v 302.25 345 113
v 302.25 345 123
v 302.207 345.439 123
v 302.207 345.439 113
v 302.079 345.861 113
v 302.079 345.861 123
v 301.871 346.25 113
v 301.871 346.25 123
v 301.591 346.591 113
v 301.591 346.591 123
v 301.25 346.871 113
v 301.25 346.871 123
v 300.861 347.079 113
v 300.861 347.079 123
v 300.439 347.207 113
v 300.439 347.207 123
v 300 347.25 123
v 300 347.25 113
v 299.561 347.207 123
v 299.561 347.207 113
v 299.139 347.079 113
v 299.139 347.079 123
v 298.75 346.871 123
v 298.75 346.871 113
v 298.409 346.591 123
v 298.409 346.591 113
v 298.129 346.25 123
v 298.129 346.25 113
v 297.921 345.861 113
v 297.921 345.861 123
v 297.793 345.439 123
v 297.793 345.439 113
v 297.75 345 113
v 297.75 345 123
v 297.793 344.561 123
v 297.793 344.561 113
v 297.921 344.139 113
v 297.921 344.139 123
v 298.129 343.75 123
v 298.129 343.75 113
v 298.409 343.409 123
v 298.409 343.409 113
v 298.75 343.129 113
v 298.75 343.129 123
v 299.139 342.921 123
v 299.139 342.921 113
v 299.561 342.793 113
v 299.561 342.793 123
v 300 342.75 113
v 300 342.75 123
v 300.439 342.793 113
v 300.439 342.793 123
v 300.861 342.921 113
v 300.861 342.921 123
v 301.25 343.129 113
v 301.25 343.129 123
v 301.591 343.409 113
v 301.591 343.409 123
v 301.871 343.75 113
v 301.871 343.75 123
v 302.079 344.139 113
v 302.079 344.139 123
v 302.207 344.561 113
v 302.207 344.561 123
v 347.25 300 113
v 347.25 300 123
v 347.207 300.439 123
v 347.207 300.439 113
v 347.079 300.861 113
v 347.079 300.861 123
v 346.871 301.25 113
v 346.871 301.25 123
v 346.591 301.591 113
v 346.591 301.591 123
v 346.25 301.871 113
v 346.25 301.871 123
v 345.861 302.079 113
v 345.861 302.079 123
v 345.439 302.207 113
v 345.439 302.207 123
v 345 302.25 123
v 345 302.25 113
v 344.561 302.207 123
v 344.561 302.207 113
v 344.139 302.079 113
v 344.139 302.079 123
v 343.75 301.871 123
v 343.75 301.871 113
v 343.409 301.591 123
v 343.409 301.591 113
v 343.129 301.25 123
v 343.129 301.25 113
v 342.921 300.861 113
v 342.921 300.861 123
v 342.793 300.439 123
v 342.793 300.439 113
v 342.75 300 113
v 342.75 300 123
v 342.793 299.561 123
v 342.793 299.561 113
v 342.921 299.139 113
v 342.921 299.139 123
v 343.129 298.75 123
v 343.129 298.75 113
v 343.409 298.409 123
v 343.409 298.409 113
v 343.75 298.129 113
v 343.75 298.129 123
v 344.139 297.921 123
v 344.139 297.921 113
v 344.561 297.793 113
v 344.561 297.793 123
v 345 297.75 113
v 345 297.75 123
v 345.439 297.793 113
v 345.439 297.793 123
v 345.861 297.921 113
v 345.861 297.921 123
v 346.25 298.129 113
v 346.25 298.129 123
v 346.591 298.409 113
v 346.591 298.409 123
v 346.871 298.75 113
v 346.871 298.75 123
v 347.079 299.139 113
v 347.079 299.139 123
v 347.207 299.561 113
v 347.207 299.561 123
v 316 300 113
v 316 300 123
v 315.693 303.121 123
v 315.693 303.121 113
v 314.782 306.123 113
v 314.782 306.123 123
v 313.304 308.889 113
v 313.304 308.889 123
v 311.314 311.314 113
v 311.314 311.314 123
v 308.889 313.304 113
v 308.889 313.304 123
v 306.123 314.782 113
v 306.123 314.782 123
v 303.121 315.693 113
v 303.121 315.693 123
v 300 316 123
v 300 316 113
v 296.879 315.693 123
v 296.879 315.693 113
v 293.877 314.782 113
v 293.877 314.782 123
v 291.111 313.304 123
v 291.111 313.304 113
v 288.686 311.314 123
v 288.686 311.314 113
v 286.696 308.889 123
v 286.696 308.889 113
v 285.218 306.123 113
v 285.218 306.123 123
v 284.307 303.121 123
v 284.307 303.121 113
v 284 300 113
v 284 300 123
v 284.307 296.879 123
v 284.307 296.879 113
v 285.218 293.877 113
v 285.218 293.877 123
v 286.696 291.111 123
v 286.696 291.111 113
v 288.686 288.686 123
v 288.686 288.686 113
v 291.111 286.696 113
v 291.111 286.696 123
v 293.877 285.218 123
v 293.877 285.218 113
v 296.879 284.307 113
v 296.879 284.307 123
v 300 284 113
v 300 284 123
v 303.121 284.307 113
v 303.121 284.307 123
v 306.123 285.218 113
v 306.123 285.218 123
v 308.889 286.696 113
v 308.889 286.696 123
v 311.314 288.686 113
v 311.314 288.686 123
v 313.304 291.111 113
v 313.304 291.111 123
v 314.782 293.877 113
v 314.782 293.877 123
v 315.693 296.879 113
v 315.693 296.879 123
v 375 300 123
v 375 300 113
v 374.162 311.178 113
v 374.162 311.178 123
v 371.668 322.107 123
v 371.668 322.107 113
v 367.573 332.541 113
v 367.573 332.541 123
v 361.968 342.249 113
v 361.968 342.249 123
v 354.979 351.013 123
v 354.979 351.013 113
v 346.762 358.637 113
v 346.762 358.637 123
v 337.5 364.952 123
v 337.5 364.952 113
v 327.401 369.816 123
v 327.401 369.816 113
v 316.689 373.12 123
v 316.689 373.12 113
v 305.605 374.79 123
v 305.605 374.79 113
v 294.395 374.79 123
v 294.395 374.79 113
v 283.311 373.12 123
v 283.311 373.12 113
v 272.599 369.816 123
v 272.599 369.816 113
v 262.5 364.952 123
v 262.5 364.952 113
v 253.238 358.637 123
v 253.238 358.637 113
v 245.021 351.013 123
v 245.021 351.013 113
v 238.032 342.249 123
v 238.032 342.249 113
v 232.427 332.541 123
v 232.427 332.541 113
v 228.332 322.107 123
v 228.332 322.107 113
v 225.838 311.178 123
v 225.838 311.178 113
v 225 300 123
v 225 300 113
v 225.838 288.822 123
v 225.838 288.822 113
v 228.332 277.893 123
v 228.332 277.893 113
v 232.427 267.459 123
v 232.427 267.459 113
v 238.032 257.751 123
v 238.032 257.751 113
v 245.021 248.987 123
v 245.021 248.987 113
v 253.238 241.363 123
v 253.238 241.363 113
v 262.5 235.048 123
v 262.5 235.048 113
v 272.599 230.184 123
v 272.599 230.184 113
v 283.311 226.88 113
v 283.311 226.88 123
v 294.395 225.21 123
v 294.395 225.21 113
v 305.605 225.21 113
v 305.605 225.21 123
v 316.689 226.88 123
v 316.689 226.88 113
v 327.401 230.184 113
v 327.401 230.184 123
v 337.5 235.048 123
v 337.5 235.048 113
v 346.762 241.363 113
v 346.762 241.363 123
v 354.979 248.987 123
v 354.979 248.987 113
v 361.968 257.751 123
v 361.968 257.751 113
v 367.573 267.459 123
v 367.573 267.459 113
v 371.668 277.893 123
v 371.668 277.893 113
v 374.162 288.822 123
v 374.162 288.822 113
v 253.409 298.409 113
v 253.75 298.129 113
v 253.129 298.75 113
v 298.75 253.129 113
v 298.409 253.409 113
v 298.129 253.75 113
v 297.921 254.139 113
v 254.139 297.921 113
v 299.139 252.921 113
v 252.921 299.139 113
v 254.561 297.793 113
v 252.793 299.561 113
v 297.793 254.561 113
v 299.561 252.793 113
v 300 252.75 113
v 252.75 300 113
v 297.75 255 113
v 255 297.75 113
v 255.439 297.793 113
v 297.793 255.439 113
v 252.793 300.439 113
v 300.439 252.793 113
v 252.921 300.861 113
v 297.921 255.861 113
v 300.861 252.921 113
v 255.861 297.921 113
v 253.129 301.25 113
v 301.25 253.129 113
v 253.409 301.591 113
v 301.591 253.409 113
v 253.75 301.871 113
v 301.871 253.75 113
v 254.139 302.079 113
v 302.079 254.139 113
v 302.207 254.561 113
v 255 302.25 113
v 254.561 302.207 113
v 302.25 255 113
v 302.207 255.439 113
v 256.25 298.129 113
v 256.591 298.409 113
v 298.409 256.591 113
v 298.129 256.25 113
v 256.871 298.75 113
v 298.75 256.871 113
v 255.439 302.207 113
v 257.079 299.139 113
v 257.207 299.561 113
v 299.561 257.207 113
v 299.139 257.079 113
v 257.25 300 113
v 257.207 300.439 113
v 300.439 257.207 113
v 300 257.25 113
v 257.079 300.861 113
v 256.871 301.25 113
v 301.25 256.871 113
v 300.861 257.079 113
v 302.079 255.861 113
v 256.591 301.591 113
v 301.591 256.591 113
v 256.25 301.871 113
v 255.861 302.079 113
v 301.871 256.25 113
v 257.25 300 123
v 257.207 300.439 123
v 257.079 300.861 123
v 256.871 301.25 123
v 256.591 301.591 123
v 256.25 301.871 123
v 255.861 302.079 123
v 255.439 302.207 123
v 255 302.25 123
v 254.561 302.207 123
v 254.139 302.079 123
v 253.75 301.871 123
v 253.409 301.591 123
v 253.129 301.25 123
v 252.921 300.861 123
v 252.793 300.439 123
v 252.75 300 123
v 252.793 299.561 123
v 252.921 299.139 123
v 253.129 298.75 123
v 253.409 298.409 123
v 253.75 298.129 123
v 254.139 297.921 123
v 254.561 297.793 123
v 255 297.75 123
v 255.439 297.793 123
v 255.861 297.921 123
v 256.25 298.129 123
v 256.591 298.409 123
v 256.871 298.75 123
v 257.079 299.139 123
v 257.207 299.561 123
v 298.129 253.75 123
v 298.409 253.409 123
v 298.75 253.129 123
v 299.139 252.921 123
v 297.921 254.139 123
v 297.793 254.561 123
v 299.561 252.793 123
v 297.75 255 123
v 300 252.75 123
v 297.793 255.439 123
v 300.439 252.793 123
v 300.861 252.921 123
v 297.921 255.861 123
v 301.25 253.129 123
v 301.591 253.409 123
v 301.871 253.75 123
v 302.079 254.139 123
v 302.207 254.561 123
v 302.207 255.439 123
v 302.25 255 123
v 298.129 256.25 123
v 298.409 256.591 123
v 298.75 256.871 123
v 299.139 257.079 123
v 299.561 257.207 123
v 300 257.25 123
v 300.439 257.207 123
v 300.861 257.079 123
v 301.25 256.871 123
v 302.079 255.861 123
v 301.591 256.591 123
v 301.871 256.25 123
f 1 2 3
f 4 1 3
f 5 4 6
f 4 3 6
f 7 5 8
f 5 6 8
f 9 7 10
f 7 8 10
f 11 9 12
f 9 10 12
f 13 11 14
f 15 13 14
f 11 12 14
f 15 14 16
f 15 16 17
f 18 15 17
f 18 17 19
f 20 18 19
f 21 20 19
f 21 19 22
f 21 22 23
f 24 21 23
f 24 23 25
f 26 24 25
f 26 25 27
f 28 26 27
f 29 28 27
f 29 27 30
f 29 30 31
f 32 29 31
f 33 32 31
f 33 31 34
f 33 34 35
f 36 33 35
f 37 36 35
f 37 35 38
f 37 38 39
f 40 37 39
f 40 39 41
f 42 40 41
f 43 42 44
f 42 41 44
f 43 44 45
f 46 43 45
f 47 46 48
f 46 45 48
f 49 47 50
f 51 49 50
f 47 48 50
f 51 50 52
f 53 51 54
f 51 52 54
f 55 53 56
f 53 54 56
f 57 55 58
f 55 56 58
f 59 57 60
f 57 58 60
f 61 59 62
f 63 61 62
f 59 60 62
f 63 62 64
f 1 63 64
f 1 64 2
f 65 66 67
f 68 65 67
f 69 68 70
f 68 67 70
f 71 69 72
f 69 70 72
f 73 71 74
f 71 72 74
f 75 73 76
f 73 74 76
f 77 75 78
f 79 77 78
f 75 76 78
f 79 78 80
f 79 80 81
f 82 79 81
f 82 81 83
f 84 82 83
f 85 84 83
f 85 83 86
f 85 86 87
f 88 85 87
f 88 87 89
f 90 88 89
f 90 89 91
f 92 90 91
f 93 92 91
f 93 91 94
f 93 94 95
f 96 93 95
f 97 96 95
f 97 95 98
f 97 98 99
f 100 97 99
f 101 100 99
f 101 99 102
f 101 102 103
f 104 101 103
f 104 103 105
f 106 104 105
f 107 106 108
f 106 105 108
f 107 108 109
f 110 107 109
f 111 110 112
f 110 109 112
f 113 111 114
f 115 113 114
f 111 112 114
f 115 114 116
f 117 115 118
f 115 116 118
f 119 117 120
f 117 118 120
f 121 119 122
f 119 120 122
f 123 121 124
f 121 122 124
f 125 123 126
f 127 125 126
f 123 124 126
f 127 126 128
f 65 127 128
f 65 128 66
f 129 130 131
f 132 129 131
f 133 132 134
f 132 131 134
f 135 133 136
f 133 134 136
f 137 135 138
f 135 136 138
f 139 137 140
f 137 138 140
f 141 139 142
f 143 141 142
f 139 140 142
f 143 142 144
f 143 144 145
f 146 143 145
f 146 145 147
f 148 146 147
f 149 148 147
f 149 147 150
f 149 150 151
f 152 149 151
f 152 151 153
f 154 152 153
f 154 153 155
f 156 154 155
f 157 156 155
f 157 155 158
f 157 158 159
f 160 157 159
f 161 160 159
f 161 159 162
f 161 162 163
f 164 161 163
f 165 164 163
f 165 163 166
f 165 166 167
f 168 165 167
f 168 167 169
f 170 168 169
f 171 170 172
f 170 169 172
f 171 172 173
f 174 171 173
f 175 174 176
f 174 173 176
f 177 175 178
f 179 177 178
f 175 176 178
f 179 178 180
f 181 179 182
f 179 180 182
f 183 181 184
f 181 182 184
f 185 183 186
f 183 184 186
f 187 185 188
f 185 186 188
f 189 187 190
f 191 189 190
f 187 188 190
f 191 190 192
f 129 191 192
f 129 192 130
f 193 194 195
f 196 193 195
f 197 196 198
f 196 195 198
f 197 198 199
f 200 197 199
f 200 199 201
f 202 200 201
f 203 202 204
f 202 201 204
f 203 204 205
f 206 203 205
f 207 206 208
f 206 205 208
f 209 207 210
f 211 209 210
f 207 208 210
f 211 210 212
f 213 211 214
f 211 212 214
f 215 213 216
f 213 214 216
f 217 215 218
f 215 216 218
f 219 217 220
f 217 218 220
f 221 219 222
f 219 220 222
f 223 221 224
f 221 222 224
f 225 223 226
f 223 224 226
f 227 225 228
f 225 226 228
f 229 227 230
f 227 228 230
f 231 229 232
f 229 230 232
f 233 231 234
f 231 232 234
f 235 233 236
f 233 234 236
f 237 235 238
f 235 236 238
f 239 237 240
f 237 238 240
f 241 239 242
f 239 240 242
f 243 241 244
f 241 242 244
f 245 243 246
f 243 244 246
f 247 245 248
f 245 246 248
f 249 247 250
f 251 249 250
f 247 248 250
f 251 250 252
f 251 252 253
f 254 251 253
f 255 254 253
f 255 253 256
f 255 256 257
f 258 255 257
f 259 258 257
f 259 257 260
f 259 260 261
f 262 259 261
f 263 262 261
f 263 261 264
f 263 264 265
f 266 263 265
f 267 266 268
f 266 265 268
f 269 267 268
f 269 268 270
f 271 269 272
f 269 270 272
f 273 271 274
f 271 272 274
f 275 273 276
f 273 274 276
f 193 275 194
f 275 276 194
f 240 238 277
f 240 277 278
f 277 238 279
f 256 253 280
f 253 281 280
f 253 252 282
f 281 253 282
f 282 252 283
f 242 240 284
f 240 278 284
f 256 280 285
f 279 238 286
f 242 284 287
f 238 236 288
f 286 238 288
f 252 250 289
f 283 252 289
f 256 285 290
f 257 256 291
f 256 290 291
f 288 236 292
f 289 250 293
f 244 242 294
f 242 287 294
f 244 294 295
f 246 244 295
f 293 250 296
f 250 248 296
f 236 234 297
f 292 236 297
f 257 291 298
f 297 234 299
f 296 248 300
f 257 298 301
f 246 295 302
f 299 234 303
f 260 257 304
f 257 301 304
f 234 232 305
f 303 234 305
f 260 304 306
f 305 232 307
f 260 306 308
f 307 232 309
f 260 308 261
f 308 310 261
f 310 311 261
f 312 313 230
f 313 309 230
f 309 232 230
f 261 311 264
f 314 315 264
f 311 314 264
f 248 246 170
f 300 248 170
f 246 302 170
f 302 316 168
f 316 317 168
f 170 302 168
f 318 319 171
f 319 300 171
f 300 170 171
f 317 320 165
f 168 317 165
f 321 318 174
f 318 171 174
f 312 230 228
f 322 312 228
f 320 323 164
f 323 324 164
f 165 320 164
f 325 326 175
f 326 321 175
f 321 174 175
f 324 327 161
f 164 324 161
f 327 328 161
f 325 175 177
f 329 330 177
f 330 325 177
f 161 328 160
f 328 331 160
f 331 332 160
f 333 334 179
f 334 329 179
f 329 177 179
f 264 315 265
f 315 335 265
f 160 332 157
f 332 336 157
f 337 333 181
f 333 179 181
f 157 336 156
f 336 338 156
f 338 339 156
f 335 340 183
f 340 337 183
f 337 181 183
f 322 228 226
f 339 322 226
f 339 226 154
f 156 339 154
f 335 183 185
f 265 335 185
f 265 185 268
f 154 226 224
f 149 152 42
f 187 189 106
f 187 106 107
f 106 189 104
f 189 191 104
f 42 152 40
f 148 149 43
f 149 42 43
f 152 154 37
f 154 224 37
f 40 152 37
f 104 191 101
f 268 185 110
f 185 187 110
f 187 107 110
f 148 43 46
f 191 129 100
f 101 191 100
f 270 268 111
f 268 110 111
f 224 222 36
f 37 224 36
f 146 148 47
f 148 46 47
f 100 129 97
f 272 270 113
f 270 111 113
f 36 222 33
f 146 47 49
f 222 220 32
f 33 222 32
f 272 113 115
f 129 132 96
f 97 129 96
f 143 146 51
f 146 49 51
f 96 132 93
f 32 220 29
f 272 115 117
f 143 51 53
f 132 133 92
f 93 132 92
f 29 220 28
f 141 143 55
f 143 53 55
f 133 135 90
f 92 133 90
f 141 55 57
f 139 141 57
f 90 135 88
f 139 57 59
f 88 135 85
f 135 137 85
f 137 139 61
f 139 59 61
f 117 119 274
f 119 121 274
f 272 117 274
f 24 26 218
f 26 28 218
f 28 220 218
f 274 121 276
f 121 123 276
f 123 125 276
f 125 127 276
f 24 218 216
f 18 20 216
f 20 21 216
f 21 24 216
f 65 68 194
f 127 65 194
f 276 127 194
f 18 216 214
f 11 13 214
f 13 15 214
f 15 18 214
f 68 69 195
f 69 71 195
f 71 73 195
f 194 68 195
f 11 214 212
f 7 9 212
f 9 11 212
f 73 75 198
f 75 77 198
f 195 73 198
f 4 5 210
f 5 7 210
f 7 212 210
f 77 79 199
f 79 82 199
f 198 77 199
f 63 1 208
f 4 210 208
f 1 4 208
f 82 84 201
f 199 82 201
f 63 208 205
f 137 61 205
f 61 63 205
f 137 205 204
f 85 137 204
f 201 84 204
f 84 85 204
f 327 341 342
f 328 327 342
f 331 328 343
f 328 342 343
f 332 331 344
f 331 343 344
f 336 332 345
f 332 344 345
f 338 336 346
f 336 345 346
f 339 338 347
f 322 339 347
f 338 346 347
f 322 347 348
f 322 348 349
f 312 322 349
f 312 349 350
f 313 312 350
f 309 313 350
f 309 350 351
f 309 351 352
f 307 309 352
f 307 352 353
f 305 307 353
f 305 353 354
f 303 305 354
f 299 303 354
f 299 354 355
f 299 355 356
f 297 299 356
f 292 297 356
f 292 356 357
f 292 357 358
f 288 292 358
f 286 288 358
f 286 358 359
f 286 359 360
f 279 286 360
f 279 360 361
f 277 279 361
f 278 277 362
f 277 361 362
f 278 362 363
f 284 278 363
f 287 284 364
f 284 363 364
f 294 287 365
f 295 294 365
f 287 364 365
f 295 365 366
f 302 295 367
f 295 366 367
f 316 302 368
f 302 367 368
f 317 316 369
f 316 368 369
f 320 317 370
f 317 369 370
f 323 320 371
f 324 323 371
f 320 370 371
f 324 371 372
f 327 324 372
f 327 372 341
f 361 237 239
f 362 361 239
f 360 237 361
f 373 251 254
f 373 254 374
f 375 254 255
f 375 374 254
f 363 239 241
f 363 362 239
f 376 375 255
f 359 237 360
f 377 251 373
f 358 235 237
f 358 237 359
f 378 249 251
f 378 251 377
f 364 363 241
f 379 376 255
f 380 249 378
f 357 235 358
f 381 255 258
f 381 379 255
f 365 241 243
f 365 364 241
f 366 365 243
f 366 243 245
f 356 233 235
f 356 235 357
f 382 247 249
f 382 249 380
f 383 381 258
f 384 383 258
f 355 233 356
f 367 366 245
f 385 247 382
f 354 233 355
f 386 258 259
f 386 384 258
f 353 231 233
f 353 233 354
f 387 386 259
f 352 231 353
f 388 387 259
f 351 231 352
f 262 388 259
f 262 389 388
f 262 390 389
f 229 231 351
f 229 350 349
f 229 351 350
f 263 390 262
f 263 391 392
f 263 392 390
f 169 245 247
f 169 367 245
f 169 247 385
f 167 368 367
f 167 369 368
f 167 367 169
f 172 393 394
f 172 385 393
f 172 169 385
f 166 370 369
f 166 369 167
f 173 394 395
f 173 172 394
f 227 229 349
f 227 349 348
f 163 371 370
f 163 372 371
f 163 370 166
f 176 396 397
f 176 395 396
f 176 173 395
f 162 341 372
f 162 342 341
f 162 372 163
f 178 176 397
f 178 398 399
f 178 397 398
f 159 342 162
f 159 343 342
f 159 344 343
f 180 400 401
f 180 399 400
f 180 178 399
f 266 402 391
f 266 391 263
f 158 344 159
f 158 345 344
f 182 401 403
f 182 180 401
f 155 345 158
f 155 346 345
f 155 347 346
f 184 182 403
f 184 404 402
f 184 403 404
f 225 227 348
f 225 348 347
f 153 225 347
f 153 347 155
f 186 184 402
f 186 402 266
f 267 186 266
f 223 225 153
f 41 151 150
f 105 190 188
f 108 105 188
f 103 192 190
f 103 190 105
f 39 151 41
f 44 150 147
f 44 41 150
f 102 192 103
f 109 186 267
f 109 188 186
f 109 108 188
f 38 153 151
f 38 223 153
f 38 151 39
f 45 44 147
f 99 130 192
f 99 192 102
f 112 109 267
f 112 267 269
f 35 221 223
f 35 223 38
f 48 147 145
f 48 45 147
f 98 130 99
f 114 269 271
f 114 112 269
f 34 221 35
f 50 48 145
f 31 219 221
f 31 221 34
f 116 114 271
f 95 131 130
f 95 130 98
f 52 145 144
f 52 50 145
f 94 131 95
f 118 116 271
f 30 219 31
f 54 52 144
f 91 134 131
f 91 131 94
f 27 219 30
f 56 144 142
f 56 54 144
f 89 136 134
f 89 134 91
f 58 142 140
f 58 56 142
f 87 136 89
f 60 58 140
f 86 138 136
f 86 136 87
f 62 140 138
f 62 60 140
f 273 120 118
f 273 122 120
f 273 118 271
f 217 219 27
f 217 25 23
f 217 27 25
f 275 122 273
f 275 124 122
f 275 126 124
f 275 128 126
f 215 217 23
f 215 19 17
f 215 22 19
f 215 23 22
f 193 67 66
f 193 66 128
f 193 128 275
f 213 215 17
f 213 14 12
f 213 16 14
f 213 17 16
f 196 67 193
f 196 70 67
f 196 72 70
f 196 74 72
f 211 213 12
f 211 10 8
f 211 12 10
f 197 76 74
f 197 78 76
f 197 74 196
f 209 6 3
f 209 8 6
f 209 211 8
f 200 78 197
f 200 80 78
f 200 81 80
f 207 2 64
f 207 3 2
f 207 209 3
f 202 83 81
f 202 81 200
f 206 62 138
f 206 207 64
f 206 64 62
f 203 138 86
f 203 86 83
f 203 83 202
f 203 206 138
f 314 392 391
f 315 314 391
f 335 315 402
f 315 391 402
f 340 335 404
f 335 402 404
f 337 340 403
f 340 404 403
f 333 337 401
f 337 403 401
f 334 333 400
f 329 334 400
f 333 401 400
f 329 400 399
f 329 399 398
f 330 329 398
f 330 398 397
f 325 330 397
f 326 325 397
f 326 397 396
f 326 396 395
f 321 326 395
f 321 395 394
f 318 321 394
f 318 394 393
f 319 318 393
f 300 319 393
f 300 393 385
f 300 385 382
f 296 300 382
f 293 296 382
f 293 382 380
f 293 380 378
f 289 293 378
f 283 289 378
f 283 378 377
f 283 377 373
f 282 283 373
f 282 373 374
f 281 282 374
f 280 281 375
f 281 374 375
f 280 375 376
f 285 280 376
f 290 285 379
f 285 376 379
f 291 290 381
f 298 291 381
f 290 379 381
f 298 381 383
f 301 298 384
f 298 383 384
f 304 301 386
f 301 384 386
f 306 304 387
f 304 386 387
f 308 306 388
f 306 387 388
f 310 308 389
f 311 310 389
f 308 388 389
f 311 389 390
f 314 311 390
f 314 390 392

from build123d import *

# Parameters (mm, degrees)
SKETCH1_R           = 75
BOSS_EXTRUDE1_DEPTH = 10
SKETCH2_R           = 16
CUT_EXTRUDE1_DEPTH  = 30
SKETCH3_R           = 2.25
CUT_EXTRUDE2_DEPTH  = 30
SKETCH4_R           = 2.25
CUT_EXTRUDE3_DEPTH  = 30
SKETCH5_R           = 2.25
CUT_EXTRUDE4_DEPTH  = 30
SKETCH6_R           = 2.25
CUT_EXTRUDE5_DEPTH  = 30


with BuildPart() as part:
    # Sketch1 → Boss-Extrude1 (new body)
    with BuildSketch(Plane.XY.offset(113)):
        with Locations((300, 300)):
            Circle(SKETCH1_R)
    extrude(amount=BOSS_EXTRUDE1_DEPTH)

    # Sketch2 → Cut-Extrude1 (cut)
    with BuildSketch(Plane.XY.offset(123)):
        with Locations((300, 300)):
            Circle(SKETCH2_R)
    extrude(amount=-CUT_EXTRUDE1_DEPTH, mode=Mode.SUBTRACT)

    # Sketch3 → Cut-Extrude2 (cut)
    with BuildSketch(Plane.XY.offset(123)):
        with Locations((345, 300)):
            Circle(SKETCH3_R)
    extrude(amount=-CUT_EXTRUDE2_DEPTH, mode=Mode.SUBTRACT)

    # Sketch4 → Cut-Extrude3 (cut)
    with BuildSketch(Plane.XY.offset(123)):
        with Locations((255, 300)):
            Circle(SKETCH4_R)
    extrude(amount=-CUT_EXTRUDE3_DEPTH, mode=Mode.SUBTRACT)

    # Sketch5 → Cut-Extrude4 (cut)
    with BuildSketch(Plane.XY.offset(123)):
        with Locations((300, 345)):
            Circle(SKETCH5_R)
    extrude(amount=-CUT_EXTRUDE4_DEPTH, mode=Mode.SUBTRACT)

    # Sketch6 → Cut-Extrude5 (cut)
    with BuildSketch(Plane.XY.offset(123)):
        with Locations((300, 255)):
            Circle(SKETCH6_R)
    extrude(amount=-CUT_EXTRUDE5_DEPTH, mode=Mode.SUBTRACT)


solid = part.part
